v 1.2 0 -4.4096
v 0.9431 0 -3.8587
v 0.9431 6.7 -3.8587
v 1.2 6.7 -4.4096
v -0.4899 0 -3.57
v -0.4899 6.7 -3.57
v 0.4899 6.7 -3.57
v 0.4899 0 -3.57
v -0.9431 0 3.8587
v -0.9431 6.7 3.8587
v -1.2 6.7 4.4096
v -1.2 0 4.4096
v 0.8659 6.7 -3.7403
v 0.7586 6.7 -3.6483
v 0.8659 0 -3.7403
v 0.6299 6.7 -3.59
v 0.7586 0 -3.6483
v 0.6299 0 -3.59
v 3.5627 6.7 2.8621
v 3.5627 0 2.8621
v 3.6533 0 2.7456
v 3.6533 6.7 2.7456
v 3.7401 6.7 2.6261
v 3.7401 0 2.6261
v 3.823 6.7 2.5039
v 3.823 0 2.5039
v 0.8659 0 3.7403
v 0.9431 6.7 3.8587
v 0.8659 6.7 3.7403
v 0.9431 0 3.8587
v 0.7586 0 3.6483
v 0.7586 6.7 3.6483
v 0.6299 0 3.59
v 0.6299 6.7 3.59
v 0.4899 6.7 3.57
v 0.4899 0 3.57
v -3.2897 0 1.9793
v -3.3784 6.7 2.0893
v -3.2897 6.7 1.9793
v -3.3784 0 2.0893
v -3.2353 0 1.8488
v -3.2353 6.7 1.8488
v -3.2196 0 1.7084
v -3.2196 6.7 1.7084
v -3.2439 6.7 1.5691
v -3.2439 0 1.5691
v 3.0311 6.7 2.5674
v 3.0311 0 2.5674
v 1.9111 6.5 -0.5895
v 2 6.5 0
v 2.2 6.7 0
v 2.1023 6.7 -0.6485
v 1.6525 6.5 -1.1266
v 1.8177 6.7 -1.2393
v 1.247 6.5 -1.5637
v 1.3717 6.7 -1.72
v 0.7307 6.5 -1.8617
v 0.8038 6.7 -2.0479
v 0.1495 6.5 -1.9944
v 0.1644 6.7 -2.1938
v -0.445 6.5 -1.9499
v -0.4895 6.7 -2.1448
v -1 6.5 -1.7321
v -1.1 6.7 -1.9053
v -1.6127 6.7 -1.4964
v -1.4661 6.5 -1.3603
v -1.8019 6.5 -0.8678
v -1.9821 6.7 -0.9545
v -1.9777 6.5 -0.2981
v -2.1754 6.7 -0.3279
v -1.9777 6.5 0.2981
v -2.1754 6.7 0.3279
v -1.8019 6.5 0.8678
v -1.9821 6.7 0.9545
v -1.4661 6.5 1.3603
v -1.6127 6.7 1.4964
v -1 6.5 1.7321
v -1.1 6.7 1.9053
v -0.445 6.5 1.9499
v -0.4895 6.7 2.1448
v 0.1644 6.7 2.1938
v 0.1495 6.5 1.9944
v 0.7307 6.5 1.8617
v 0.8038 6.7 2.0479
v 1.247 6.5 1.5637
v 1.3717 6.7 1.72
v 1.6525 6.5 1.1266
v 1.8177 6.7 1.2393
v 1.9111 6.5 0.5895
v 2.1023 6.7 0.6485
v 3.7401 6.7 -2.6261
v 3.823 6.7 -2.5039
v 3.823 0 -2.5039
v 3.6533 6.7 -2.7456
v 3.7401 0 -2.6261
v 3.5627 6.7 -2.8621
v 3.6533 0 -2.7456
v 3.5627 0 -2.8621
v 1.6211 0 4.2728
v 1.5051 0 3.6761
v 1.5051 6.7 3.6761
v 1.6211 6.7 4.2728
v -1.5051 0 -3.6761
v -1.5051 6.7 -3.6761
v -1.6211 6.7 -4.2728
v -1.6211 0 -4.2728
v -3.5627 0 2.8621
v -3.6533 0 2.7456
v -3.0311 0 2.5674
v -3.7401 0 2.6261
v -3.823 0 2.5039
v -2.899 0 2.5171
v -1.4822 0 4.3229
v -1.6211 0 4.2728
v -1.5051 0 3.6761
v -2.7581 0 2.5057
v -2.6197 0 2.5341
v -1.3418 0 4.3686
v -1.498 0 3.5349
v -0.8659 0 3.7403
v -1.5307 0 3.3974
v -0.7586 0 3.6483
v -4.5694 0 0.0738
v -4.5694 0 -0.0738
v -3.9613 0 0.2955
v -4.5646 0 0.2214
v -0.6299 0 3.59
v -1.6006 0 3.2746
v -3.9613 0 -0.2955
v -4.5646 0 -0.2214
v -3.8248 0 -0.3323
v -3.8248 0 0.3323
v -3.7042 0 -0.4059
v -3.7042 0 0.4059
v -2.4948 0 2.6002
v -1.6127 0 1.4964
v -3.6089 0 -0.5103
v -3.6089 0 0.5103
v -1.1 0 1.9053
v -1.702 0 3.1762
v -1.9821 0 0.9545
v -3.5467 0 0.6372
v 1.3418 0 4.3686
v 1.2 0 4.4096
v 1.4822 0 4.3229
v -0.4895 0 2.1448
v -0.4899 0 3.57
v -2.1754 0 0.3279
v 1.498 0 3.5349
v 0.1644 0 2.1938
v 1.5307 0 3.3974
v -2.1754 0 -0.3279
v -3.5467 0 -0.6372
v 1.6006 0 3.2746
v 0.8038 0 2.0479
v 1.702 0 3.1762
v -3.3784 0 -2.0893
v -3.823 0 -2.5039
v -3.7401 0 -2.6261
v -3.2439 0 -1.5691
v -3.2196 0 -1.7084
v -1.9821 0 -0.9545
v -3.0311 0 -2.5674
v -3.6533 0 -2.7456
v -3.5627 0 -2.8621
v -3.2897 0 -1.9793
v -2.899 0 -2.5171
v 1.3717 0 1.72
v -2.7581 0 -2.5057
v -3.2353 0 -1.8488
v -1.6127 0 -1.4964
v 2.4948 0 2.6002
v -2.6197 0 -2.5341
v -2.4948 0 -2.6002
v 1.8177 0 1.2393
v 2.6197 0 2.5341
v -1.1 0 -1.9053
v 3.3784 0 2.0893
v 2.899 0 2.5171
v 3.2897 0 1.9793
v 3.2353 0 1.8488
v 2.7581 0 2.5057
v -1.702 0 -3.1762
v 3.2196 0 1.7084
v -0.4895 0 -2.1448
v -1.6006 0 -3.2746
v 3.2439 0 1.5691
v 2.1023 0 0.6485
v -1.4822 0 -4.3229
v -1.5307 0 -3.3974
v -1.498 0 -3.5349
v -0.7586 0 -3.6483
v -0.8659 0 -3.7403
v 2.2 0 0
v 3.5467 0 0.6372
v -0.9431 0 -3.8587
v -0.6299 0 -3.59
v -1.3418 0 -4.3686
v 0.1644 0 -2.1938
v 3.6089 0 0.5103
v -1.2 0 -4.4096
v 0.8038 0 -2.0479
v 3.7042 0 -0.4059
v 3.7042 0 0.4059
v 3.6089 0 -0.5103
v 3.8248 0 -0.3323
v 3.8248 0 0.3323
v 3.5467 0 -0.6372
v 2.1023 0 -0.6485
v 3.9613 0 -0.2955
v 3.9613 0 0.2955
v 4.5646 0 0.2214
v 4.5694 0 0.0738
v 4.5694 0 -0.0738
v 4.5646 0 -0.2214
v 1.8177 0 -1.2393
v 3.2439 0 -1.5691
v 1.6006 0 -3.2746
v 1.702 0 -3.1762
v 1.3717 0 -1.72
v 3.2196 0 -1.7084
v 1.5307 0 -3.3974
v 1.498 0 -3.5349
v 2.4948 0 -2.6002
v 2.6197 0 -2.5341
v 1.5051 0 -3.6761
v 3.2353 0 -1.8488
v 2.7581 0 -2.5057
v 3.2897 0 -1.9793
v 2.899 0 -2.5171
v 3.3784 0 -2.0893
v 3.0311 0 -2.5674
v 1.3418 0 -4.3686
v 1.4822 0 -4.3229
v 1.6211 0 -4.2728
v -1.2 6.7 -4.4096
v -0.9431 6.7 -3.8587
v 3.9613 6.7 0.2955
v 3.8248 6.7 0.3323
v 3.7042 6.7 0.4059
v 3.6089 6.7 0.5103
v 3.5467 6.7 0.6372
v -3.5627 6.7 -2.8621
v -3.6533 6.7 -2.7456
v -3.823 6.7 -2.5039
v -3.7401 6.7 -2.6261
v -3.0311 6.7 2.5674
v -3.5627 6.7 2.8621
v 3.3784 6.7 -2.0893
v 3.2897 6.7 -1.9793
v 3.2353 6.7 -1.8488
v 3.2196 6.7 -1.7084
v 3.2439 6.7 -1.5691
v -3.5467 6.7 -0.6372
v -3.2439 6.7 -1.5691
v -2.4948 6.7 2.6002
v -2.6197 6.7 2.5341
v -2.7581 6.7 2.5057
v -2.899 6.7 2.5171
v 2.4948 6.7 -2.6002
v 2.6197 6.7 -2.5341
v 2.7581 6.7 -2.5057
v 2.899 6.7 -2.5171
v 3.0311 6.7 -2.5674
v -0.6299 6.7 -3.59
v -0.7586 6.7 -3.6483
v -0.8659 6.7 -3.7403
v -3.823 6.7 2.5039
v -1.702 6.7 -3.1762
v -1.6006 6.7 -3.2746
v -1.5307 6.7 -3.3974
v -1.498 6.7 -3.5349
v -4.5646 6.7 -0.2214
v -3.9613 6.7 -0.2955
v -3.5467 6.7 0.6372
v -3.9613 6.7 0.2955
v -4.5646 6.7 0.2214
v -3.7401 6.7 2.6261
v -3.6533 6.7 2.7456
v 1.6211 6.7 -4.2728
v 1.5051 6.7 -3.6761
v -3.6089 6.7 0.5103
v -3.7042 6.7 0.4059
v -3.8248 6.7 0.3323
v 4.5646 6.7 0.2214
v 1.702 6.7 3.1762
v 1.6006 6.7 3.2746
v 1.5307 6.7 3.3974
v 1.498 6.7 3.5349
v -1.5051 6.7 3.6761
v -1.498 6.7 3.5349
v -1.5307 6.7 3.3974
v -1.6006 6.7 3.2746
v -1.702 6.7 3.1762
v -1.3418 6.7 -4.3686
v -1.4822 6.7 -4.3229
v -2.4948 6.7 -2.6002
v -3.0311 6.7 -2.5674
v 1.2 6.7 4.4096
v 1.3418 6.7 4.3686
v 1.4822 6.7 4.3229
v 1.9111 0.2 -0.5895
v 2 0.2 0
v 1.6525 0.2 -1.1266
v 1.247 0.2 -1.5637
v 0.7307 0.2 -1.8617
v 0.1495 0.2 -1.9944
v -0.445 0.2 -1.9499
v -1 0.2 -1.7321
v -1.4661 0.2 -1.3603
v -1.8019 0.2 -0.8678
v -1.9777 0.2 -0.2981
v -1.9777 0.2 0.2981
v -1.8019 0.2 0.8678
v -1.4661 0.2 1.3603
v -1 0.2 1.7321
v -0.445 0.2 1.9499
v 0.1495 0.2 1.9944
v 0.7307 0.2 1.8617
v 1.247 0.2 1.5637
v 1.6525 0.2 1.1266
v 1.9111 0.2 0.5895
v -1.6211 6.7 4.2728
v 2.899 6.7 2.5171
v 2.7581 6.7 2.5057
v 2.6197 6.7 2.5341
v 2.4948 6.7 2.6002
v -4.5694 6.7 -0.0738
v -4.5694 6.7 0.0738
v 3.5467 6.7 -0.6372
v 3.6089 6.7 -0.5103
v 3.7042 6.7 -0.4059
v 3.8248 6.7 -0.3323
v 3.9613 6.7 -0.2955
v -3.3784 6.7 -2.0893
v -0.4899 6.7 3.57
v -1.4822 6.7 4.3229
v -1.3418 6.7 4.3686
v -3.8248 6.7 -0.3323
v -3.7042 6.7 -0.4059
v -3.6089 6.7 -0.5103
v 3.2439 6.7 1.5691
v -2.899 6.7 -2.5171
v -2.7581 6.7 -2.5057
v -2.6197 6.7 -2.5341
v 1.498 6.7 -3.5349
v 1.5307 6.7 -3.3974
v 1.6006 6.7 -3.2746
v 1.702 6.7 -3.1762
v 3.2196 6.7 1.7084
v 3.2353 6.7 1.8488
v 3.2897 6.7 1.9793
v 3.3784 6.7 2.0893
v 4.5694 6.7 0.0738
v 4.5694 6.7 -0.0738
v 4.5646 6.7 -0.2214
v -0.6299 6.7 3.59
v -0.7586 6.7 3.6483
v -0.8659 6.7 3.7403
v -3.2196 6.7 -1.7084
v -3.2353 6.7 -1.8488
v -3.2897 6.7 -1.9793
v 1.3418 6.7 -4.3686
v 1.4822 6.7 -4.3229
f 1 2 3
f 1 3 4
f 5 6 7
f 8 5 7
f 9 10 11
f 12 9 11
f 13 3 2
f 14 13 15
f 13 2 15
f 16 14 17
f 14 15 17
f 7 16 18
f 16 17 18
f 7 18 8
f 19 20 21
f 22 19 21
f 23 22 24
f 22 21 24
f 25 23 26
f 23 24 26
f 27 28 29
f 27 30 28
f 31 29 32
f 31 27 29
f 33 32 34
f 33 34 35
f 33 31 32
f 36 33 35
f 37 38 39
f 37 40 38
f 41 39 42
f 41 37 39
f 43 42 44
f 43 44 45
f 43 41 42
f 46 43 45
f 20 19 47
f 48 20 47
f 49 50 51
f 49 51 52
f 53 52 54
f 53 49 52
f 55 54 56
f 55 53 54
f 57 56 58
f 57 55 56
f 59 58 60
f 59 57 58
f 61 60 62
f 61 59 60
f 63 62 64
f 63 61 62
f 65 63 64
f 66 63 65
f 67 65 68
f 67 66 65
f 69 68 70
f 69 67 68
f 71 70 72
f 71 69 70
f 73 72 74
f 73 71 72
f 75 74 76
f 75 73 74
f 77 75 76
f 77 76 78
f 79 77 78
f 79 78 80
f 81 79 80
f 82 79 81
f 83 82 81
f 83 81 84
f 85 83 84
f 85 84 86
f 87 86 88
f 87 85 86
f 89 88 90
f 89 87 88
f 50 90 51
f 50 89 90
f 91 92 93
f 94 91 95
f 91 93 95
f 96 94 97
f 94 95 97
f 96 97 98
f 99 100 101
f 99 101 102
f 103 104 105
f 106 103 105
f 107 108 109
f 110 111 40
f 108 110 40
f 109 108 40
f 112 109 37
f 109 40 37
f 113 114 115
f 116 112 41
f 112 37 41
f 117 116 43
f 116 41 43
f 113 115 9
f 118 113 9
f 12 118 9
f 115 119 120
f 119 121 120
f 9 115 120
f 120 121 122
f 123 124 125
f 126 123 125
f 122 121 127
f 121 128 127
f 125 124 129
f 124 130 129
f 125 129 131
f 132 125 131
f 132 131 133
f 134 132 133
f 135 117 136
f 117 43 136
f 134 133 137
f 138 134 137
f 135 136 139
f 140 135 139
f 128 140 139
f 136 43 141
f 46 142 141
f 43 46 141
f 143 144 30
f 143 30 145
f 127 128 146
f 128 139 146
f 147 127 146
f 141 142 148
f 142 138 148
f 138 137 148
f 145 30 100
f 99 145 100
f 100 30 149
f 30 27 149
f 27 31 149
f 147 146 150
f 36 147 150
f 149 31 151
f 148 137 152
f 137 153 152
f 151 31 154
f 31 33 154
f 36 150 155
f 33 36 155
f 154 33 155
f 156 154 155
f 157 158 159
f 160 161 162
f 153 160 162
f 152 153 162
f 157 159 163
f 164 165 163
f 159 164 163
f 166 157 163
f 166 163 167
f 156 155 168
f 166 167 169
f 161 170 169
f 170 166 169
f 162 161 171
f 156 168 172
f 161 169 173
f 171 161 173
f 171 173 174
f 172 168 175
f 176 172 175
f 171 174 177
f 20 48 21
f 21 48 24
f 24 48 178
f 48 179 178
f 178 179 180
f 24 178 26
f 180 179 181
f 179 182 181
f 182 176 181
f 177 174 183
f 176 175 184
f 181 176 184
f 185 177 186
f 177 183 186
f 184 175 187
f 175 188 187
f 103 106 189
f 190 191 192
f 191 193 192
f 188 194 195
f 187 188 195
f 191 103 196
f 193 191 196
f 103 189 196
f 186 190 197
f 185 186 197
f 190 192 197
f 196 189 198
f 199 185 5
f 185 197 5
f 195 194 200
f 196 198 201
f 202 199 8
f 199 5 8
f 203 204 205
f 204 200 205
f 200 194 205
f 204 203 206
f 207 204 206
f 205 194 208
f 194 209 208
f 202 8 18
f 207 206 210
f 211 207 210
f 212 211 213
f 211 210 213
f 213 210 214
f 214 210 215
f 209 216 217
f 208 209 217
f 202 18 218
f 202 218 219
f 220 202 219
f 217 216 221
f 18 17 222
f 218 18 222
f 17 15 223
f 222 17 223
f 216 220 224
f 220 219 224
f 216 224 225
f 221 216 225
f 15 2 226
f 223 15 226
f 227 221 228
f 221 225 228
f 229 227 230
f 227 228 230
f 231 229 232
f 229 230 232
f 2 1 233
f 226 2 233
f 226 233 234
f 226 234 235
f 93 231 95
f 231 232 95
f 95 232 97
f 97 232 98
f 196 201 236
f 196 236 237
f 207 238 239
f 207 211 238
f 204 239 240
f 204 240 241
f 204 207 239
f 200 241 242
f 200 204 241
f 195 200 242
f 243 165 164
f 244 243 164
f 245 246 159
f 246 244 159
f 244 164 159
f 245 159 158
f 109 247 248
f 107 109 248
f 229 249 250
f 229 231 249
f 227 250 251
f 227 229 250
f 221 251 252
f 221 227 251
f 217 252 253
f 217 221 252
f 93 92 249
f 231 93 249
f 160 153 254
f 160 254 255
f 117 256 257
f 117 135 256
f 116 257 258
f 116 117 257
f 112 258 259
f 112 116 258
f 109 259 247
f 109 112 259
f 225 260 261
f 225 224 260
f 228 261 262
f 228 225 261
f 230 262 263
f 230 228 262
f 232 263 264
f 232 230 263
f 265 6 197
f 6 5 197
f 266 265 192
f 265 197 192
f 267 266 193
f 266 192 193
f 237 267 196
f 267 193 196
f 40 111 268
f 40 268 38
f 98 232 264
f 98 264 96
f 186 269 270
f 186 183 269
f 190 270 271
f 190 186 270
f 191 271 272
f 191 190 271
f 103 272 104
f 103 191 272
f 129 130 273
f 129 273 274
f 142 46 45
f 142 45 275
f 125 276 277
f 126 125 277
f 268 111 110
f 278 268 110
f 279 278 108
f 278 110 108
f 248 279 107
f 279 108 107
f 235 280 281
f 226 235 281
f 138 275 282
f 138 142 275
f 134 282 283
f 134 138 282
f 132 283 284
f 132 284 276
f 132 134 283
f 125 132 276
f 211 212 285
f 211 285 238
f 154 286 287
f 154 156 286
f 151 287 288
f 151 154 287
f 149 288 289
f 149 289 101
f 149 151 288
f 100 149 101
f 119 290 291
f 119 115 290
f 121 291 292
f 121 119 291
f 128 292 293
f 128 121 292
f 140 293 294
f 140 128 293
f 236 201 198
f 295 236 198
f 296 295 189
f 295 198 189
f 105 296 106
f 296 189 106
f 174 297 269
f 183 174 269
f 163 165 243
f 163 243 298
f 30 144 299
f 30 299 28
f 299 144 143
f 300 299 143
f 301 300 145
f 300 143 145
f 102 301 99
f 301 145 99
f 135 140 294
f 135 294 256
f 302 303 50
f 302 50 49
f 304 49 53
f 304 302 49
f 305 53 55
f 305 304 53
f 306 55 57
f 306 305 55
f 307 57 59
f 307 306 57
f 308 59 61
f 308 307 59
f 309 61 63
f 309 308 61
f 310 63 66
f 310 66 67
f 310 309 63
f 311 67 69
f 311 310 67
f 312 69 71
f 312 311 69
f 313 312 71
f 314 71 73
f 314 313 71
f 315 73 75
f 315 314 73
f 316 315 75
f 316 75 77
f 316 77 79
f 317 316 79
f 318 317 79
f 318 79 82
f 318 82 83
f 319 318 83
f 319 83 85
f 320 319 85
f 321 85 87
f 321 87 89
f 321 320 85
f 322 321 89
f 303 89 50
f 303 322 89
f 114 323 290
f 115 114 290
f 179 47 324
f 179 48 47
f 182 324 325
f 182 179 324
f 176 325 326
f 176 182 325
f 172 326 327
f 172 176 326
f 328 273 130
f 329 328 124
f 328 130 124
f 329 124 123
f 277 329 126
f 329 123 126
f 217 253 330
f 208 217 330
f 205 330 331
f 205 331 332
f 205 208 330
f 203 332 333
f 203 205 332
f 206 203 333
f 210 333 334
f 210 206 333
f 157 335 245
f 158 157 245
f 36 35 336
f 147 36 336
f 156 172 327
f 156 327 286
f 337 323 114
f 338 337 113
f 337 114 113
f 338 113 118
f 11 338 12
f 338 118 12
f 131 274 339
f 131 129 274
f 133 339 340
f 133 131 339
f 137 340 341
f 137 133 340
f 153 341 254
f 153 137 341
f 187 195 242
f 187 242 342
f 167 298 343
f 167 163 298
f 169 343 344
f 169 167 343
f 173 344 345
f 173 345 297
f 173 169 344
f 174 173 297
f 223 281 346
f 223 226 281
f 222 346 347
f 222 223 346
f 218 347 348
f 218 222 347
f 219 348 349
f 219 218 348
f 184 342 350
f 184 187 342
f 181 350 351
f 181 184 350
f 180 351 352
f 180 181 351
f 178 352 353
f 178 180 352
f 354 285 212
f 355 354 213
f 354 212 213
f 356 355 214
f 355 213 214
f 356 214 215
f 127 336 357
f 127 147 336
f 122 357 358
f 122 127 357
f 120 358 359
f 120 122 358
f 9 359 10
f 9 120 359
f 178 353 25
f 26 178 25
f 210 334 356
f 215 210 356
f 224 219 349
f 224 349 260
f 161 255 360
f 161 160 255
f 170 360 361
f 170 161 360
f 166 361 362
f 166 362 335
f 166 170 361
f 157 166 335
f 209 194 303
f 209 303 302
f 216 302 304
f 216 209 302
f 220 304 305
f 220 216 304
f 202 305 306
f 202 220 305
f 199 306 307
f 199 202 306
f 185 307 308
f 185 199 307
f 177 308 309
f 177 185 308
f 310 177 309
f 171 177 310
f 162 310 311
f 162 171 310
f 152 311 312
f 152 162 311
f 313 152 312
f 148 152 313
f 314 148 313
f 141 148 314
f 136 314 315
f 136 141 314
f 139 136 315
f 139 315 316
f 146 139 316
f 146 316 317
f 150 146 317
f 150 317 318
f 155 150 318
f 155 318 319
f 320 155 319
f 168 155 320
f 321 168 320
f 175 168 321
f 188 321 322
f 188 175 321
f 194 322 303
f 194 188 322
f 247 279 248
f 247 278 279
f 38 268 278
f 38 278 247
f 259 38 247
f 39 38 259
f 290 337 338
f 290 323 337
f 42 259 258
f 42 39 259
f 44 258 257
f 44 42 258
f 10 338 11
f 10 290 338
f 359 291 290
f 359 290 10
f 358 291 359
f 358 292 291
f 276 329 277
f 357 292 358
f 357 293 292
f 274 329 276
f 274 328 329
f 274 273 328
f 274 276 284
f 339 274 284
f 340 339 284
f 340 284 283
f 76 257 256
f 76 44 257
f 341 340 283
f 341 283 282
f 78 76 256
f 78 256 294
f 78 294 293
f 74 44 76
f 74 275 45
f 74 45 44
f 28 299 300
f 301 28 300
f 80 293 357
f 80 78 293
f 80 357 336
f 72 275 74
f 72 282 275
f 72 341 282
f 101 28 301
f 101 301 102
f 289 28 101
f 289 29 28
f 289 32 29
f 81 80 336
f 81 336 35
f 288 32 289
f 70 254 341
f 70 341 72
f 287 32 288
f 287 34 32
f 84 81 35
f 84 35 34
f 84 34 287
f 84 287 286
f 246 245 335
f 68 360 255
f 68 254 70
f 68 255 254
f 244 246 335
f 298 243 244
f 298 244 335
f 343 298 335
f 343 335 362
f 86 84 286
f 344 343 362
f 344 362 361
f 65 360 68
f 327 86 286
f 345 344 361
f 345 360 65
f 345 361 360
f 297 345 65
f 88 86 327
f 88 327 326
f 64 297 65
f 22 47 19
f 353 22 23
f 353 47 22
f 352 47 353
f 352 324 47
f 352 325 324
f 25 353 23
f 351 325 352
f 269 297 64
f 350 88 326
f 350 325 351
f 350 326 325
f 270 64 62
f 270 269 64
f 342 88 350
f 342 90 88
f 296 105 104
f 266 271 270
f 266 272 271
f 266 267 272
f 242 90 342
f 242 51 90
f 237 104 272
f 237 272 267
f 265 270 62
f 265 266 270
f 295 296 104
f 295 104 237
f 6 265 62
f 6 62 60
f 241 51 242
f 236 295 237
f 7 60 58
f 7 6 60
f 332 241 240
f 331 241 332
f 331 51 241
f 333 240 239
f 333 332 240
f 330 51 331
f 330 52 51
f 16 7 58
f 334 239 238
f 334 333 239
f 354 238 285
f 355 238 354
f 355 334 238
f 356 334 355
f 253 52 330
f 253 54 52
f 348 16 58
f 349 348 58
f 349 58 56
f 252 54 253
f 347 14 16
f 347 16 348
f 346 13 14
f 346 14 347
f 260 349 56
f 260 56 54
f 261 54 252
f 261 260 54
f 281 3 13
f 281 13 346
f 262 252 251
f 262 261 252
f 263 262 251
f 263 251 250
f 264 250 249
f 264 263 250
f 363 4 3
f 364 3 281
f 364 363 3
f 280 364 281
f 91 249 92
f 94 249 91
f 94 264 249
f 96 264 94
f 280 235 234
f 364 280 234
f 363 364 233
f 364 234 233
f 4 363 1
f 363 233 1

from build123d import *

# Parameters (mm, degrees)
SKIZZE1_R                       = 4.57
SKIZZE1_R_2                     = 2
AUFSATZ_LINEAR_AUSTRAGEN1_DEPTH = 6.7
SCHNITT_LINEAR_AUSTRAGEN1_DEPTH = 10.309124556
VERRUNDUNG1_R                   = 0.5
KREISMUSTER1_COUNT              = 10
VERRUNDUNG1_OF_KREISMUSTER1_R   = 0.5
FASE2_SIZE                      = 0.2


with BuildPart() as part:
    # Skizze1 → Aufsatz-Linear austragen1 (new body)
    with BuildSketch(Plane(origin=(0, 0, 0), x_dir=(1, 0, 0), z_dir=(0, 1, 0))):
        Circle(SKIZZE1_R)
        Circle(SKIZZE1_R_2, mode=Mode.SUBTRACT)
    extrude(amount=AUFSATZ_LINEAR_AUSTRAGEN1_DEPTH)

    # Skizze12 → Schnitt-Linear austragen1 (cut, through all)
    with BuildSketch(Plane(origin=(0, 6.7, 0), x_dir=(1, 0, 0), z_dir=(0, 1, 0))):
        with BuildLine():
            Line((-1.2, 4.409637173), (-0.808470756, 3.57))
            Line((-0.808470756, 3.57), (0.808470756, 3.57))
            Line((0.808470756, 3.57), (1.2, 4.409637173))
            ThreePointArc((1.2, 4.409637173), (0, 4.57), (-1.2, 4.409637173))
        make_face()
    schnitt_linear_austragen1 = extrude(amount=-SCHNITT_LINEAR_AUSTRAGEN1_DEPTH, mode=Mode.SUBTRACT)

    # Verrundung1
    verrundung1_edges = [part.edges().sort_by_distance(p)[0] for p in [
        (0.808470756, 3.35, -3.57),
        (-0.808470756, 3.35, -3.57),
    ]]
    fillet(verrundung1_edges, radius=VERRUNDUNG1_R)

    # Kreismuster1: Schnitt-Linear austragen1 ×10 about axis
    kreismuster1_axis = Axis((0, -12.75, 0), (0, 1, 0))
    for i in range(1, KREISMUSTER1_COUNT):
        add(schnitt_linear_austragen1.rotate(kreismuster1_axis, i * 360 / KREISMUSTER1_COUNT), mode=Mode.SUBTRACT)

    # Verrundung1 of Kreismuster1
    verrundung1_of_kreismuster1_edges = [part.edges().sort_by_distance(p)[0] for p in [
        (-1.44432677, 3.35, -3.363397857),
        (-2.752459932, 3.35, -2.412983483),
        (-3.14544056, 3.35, -1.872092051),
        (-3.645102966, 3.35, -0.334289289),
        (-3.645102966, 3.35, 0.334289289),
        (-3.14544056, 3.35, 1.872092051),
        (-2.752459932, 3.35, 2.412983483),
        (-1.44432677, 3.35, 3.363397857),
        (-0.808470756, 3.35, 3.57),
        (0.808470756, 3.35, 3.57),
        (1.44432677, 3.35, 3.363397857),
        (2.752459932, 3.35, 2.412983483),
        (3.14544056, 3.35, 1.872092051),
        (3.645102966, 3.35, 0.334289289),
        (3.645102966, 3.35, -0.334289289),
        (3.14544056, 3.35, -1.872092051),
        (2.752459932, 3.35, -2.412983483),
        (1.44432677, 3.35, -3.363397857),
    ]]
    fillet(verrundung1_of_kreismuster1_edges, radius=VERRUNDUNG1_OF_KREISMUSTER1_R)

    # Fase2
    fase2_edges = [part.edges().sort_by_distance(p)[0] for p in [
        (-2, 6.7, 0),
        (-2, 0, 0),
    ]]
    chamfer(fase2_edges, length=FASE2_SIZE)


solid = part.part
